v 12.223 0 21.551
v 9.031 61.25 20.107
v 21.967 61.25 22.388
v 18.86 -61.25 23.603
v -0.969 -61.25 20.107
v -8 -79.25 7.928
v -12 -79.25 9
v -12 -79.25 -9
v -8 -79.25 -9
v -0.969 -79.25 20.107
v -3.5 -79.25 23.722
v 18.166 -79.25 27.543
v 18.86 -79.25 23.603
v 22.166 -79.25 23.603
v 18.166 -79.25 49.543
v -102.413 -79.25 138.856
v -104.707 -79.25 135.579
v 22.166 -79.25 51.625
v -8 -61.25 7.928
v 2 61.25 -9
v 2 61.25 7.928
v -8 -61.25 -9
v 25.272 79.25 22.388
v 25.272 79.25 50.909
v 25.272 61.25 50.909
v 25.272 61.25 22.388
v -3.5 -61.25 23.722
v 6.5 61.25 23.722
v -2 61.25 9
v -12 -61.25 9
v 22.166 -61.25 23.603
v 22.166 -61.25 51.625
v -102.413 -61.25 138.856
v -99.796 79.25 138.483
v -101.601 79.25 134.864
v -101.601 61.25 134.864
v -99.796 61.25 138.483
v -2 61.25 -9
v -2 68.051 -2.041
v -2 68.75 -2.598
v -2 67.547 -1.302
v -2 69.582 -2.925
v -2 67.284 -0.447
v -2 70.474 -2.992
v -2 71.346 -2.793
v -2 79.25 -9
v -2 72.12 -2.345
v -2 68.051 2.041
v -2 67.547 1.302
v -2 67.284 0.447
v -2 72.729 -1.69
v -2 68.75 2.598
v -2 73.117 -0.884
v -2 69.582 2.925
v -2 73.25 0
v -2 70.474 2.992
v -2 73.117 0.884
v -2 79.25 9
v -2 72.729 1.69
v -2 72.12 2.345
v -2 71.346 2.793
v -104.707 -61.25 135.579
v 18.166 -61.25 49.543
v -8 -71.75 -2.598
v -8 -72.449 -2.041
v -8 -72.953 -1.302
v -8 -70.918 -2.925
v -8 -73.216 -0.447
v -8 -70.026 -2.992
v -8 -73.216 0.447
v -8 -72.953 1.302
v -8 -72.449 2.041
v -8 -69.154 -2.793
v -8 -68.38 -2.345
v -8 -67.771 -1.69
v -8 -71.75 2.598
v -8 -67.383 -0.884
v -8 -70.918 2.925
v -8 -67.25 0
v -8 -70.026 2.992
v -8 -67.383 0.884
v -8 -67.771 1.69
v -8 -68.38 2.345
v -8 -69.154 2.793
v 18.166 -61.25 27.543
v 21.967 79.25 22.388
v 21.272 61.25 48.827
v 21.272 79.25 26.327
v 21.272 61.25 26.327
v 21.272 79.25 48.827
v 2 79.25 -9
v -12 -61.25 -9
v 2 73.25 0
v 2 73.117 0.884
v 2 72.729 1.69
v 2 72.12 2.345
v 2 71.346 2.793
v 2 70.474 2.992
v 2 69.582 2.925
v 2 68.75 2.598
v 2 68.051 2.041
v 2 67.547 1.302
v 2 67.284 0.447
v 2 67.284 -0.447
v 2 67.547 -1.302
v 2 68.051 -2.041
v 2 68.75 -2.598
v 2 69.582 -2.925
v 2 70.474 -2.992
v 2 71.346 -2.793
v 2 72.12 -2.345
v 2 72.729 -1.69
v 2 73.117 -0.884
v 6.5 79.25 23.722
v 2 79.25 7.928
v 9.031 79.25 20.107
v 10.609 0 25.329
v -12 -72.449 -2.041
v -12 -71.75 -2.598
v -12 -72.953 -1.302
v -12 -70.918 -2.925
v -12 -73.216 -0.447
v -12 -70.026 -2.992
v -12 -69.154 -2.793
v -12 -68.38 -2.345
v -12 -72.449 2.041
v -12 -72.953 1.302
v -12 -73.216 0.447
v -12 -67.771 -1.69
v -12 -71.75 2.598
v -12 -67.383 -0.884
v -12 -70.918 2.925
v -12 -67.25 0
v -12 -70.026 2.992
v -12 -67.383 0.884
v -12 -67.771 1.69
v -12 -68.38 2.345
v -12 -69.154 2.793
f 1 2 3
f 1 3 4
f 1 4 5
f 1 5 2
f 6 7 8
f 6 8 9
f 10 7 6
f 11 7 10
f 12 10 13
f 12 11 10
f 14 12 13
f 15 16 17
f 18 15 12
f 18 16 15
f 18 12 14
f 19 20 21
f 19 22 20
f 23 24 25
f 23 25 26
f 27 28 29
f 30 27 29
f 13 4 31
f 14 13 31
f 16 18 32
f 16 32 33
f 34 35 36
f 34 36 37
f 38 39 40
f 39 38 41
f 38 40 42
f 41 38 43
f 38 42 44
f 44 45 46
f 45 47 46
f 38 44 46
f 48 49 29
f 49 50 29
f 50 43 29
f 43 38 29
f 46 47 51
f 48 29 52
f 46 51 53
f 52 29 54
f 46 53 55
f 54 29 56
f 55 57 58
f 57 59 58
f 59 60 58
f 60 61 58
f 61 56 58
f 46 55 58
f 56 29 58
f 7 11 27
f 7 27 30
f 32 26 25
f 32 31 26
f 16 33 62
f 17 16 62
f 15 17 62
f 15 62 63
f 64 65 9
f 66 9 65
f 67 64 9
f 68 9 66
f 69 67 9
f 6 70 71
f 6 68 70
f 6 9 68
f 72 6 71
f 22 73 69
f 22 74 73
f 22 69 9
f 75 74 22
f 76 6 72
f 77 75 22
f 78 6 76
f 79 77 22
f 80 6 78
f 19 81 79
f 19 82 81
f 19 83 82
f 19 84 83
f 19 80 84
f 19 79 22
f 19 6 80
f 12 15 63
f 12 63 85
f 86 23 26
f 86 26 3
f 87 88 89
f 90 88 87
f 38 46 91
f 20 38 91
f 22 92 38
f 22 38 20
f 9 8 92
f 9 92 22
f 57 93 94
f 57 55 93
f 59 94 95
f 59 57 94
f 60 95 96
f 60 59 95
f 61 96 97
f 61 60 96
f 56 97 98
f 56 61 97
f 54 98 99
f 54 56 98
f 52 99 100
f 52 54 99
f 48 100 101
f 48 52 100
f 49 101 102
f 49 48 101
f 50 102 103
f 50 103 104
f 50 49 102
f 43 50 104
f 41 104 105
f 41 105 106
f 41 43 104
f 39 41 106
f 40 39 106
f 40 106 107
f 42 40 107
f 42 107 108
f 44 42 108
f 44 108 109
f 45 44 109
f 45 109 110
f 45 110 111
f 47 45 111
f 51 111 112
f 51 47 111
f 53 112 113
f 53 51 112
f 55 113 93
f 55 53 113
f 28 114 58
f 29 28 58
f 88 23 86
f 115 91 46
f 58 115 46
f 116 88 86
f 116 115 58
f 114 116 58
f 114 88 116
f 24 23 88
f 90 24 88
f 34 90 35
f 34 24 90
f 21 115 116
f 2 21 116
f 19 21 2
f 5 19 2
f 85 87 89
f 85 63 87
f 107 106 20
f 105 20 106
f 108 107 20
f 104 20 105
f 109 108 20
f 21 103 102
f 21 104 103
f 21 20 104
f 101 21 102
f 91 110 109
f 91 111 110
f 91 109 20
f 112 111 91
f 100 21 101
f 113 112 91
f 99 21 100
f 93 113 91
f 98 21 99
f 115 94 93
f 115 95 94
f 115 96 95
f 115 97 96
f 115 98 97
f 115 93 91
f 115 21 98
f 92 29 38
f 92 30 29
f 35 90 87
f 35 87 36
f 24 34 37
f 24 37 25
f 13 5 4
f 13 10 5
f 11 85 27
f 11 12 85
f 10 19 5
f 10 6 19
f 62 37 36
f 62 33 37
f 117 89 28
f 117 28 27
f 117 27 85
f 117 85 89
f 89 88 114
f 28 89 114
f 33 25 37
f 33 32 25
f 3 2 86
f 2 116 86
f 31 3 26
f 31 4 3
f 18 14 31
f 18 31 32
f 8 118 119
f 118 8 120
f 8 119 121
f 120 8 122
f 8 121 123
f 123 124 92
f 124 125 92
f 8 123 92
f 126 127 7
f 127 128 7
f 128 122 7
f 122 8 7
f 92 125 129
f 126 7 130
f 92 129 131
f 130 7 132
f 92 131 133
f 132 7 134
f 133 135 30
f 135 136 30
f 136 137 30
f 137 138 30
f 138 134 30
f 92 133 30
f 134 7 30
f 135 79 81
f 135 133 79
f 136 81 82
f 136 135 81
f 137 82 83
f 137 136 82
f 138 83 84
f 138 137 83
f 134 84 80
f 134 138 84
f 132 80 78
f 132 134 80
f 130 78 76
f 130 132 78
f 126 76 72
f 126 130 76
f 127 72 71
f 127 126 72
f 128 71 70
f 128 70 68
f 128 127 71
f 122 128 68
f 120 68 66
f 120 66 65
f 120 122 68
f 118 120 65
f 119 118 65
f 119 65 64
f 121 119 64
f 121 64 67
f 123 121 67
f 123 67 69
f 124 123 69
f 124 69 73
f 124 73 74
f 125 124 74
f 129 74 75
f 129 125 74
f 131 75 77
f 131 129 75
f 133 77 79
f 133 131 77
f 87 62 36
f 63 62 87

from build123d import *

# Parameters (mm, degrees)
F3_W           = 18
F3_H           = 18
F3_R           = 3
F4_DEPTH       = 2
F5_W           = 18
F5_H           = 18
F5_R           = 3
F6_DEPTH       = 2
F8_DEPTH       = 9
F8_DEPTH_BACK  = 9
F10_DEPTH      = 9
F10_DEPTH_BACK = 9
F12_DEPTH      = 18
F14_DEPTH      = 18


with BuildPart() as f4:
    # F3 (on Right) → F4 (new body, symmetric)
    with BuildSketch(Plane.YZ):
        with Locations((70.25, 0)):
            Rectangle(F3_W, F3_H)
        with Locations((70.25, 0)):
            Circle(F3_R, mode=Mode.SUBTRACT)
    extrude(amount=F4_DEPTH, both=True)

    # F7 (on offset) → F8 (join, two sides)
    with BuildSketch(Plane.XZ.offset(-70.25)) as f8_sk:
        Polygon((6.5, 23.7224318643), (-2, 9), (2, 9), (2, 7.9282032303), (9.0314862988, 20.1070947526), (21.9667090059, 22.3879235173), (21.2721162952, 26.3271545293), align=None)
    extrude(amount=-F8_DEPTH)
    extrude(f8_sk.sketch, amount=F8_DEPTH_BACK)

    # F11 (on face) → F12 (join, through all)
    with BuildSketch(Plane(origin=(0, 79.25, 0), x_dir=(-1, 0, 0), z_dir=(0, 1, 0))):
        Polygon((-21.9667090059, 22.3879235173), (-21.2721162952, 26.3271545293), (-21.2721162952, 48.8271545293), (101.6006903482, 134.863619982), (99.7962957674, 138.4832676497), (-25.2721162952, 50.9094227315), (-25.2721162952, 22.3879235173), align=None)
    extrude(amount=-F12_DEPTH)



with BuildPart() as f6:
    # F5 (on offset) → F6 (new body, symmetric)
    with BuildSketch(Plane.YZ.offset(-10)):
        with Locations((-70.25, 0)):
            Rectangle(F5_W, F5_H)
        with Locations((-70.25, 0)):
            Circle(F5_R, mode=Mode.SUBTRACT)
    extrude(amount=F6_DEPTH, both=True)

    # F9 (on offset) → F10 (join, two sides)
    with BuildSketch(Plane.XZ.offset(70.25)) as f10_sk:
        Polygon((18.1657705663, 27.542691773), (-3.5, 23.7224318643), (-12, 9), (-8, 9), (-8, 7.9282032303), (-0.9685137012, 20.1070947526), (18.8603632769, 23.603460761), align=None)
    extrude(amount=F10_DEPTH)
    extrude(f10_sk.sketch, amount=-F10_DEPTH_BACK)

    # F13 (on face) → F14 (join, through all)
    with BuildSketch(Plane.XZ.offset(79.25)):
        Polygon((18.1657705663, 49.542691773), (18.1657705663, 27.542691773), (18.8603632769, 23.603460761), (22.1657705663, 23.603460761), (22.1657705663, 51.6249599752), (-102.4127303317, 138.8557654028), (-104.7070360771, 135.5791572257), align=None)
    extrude(amount=-F14_DEPTH)


with BuildPart() as f4_1:
    add(f4.part)

    add(f6.part)  # F15 merges F6
    # F12_face (on face) → F15 section 0
    with BuildSketch(Plane(origin=(-21.9904596416, 61.25, 69.4287440583), x_dir=(1, 0, 0), z_dir=(0, -1, 0))):
        Polygon((19.9904596416, -60.4287440583), (19.9904596416, -78.4287440583), (23.9904596416, -78.4287440583), (23.9904596416, -61.500540828), (31.0219459404, -49.3216493057), (43.9571686475, -47.040820541), (47.2625759368, -47.040820541), (47.2625759368, -18.5193213268), (-77.8058361258, 69.0545235914), (-79.6102307066, 65.4348759237), (43.2625759368, -20.601589529), (43.2625759368, -43.101589529), (28.4904596416, -45.706312194), align=None)
    # F14_face (on face) → F15 section 1
    with BuildSketch(Plane(origin=(-25.2803198576, -61.25, 68.6471085342), x_dir=(-1, 0, 0), z_dir=(0, 1, 0))):
        Polygon((-13.2803198576, -77.6471085342), (-13.2803198576, -59.6471085342), (-21.7803198576, -44.9246766699), (-43.4460904239, -41.1044167612), (-43.4460904239, -19.1044167612), (79.4267162195, 66.9320486914), (77.1324104741, 70.2086568686), (-47.4460904239, -17.022148559), (-47.4460904239, -45.0436477733), (-44.1406831345, -45.0436477733), (-24.3118061564, -48.5400137817), (-17.2803198576, -60.7189053039), (-17.2803198576, -77.6471085342), align=None)
    loft()


solid = f4_1.part
